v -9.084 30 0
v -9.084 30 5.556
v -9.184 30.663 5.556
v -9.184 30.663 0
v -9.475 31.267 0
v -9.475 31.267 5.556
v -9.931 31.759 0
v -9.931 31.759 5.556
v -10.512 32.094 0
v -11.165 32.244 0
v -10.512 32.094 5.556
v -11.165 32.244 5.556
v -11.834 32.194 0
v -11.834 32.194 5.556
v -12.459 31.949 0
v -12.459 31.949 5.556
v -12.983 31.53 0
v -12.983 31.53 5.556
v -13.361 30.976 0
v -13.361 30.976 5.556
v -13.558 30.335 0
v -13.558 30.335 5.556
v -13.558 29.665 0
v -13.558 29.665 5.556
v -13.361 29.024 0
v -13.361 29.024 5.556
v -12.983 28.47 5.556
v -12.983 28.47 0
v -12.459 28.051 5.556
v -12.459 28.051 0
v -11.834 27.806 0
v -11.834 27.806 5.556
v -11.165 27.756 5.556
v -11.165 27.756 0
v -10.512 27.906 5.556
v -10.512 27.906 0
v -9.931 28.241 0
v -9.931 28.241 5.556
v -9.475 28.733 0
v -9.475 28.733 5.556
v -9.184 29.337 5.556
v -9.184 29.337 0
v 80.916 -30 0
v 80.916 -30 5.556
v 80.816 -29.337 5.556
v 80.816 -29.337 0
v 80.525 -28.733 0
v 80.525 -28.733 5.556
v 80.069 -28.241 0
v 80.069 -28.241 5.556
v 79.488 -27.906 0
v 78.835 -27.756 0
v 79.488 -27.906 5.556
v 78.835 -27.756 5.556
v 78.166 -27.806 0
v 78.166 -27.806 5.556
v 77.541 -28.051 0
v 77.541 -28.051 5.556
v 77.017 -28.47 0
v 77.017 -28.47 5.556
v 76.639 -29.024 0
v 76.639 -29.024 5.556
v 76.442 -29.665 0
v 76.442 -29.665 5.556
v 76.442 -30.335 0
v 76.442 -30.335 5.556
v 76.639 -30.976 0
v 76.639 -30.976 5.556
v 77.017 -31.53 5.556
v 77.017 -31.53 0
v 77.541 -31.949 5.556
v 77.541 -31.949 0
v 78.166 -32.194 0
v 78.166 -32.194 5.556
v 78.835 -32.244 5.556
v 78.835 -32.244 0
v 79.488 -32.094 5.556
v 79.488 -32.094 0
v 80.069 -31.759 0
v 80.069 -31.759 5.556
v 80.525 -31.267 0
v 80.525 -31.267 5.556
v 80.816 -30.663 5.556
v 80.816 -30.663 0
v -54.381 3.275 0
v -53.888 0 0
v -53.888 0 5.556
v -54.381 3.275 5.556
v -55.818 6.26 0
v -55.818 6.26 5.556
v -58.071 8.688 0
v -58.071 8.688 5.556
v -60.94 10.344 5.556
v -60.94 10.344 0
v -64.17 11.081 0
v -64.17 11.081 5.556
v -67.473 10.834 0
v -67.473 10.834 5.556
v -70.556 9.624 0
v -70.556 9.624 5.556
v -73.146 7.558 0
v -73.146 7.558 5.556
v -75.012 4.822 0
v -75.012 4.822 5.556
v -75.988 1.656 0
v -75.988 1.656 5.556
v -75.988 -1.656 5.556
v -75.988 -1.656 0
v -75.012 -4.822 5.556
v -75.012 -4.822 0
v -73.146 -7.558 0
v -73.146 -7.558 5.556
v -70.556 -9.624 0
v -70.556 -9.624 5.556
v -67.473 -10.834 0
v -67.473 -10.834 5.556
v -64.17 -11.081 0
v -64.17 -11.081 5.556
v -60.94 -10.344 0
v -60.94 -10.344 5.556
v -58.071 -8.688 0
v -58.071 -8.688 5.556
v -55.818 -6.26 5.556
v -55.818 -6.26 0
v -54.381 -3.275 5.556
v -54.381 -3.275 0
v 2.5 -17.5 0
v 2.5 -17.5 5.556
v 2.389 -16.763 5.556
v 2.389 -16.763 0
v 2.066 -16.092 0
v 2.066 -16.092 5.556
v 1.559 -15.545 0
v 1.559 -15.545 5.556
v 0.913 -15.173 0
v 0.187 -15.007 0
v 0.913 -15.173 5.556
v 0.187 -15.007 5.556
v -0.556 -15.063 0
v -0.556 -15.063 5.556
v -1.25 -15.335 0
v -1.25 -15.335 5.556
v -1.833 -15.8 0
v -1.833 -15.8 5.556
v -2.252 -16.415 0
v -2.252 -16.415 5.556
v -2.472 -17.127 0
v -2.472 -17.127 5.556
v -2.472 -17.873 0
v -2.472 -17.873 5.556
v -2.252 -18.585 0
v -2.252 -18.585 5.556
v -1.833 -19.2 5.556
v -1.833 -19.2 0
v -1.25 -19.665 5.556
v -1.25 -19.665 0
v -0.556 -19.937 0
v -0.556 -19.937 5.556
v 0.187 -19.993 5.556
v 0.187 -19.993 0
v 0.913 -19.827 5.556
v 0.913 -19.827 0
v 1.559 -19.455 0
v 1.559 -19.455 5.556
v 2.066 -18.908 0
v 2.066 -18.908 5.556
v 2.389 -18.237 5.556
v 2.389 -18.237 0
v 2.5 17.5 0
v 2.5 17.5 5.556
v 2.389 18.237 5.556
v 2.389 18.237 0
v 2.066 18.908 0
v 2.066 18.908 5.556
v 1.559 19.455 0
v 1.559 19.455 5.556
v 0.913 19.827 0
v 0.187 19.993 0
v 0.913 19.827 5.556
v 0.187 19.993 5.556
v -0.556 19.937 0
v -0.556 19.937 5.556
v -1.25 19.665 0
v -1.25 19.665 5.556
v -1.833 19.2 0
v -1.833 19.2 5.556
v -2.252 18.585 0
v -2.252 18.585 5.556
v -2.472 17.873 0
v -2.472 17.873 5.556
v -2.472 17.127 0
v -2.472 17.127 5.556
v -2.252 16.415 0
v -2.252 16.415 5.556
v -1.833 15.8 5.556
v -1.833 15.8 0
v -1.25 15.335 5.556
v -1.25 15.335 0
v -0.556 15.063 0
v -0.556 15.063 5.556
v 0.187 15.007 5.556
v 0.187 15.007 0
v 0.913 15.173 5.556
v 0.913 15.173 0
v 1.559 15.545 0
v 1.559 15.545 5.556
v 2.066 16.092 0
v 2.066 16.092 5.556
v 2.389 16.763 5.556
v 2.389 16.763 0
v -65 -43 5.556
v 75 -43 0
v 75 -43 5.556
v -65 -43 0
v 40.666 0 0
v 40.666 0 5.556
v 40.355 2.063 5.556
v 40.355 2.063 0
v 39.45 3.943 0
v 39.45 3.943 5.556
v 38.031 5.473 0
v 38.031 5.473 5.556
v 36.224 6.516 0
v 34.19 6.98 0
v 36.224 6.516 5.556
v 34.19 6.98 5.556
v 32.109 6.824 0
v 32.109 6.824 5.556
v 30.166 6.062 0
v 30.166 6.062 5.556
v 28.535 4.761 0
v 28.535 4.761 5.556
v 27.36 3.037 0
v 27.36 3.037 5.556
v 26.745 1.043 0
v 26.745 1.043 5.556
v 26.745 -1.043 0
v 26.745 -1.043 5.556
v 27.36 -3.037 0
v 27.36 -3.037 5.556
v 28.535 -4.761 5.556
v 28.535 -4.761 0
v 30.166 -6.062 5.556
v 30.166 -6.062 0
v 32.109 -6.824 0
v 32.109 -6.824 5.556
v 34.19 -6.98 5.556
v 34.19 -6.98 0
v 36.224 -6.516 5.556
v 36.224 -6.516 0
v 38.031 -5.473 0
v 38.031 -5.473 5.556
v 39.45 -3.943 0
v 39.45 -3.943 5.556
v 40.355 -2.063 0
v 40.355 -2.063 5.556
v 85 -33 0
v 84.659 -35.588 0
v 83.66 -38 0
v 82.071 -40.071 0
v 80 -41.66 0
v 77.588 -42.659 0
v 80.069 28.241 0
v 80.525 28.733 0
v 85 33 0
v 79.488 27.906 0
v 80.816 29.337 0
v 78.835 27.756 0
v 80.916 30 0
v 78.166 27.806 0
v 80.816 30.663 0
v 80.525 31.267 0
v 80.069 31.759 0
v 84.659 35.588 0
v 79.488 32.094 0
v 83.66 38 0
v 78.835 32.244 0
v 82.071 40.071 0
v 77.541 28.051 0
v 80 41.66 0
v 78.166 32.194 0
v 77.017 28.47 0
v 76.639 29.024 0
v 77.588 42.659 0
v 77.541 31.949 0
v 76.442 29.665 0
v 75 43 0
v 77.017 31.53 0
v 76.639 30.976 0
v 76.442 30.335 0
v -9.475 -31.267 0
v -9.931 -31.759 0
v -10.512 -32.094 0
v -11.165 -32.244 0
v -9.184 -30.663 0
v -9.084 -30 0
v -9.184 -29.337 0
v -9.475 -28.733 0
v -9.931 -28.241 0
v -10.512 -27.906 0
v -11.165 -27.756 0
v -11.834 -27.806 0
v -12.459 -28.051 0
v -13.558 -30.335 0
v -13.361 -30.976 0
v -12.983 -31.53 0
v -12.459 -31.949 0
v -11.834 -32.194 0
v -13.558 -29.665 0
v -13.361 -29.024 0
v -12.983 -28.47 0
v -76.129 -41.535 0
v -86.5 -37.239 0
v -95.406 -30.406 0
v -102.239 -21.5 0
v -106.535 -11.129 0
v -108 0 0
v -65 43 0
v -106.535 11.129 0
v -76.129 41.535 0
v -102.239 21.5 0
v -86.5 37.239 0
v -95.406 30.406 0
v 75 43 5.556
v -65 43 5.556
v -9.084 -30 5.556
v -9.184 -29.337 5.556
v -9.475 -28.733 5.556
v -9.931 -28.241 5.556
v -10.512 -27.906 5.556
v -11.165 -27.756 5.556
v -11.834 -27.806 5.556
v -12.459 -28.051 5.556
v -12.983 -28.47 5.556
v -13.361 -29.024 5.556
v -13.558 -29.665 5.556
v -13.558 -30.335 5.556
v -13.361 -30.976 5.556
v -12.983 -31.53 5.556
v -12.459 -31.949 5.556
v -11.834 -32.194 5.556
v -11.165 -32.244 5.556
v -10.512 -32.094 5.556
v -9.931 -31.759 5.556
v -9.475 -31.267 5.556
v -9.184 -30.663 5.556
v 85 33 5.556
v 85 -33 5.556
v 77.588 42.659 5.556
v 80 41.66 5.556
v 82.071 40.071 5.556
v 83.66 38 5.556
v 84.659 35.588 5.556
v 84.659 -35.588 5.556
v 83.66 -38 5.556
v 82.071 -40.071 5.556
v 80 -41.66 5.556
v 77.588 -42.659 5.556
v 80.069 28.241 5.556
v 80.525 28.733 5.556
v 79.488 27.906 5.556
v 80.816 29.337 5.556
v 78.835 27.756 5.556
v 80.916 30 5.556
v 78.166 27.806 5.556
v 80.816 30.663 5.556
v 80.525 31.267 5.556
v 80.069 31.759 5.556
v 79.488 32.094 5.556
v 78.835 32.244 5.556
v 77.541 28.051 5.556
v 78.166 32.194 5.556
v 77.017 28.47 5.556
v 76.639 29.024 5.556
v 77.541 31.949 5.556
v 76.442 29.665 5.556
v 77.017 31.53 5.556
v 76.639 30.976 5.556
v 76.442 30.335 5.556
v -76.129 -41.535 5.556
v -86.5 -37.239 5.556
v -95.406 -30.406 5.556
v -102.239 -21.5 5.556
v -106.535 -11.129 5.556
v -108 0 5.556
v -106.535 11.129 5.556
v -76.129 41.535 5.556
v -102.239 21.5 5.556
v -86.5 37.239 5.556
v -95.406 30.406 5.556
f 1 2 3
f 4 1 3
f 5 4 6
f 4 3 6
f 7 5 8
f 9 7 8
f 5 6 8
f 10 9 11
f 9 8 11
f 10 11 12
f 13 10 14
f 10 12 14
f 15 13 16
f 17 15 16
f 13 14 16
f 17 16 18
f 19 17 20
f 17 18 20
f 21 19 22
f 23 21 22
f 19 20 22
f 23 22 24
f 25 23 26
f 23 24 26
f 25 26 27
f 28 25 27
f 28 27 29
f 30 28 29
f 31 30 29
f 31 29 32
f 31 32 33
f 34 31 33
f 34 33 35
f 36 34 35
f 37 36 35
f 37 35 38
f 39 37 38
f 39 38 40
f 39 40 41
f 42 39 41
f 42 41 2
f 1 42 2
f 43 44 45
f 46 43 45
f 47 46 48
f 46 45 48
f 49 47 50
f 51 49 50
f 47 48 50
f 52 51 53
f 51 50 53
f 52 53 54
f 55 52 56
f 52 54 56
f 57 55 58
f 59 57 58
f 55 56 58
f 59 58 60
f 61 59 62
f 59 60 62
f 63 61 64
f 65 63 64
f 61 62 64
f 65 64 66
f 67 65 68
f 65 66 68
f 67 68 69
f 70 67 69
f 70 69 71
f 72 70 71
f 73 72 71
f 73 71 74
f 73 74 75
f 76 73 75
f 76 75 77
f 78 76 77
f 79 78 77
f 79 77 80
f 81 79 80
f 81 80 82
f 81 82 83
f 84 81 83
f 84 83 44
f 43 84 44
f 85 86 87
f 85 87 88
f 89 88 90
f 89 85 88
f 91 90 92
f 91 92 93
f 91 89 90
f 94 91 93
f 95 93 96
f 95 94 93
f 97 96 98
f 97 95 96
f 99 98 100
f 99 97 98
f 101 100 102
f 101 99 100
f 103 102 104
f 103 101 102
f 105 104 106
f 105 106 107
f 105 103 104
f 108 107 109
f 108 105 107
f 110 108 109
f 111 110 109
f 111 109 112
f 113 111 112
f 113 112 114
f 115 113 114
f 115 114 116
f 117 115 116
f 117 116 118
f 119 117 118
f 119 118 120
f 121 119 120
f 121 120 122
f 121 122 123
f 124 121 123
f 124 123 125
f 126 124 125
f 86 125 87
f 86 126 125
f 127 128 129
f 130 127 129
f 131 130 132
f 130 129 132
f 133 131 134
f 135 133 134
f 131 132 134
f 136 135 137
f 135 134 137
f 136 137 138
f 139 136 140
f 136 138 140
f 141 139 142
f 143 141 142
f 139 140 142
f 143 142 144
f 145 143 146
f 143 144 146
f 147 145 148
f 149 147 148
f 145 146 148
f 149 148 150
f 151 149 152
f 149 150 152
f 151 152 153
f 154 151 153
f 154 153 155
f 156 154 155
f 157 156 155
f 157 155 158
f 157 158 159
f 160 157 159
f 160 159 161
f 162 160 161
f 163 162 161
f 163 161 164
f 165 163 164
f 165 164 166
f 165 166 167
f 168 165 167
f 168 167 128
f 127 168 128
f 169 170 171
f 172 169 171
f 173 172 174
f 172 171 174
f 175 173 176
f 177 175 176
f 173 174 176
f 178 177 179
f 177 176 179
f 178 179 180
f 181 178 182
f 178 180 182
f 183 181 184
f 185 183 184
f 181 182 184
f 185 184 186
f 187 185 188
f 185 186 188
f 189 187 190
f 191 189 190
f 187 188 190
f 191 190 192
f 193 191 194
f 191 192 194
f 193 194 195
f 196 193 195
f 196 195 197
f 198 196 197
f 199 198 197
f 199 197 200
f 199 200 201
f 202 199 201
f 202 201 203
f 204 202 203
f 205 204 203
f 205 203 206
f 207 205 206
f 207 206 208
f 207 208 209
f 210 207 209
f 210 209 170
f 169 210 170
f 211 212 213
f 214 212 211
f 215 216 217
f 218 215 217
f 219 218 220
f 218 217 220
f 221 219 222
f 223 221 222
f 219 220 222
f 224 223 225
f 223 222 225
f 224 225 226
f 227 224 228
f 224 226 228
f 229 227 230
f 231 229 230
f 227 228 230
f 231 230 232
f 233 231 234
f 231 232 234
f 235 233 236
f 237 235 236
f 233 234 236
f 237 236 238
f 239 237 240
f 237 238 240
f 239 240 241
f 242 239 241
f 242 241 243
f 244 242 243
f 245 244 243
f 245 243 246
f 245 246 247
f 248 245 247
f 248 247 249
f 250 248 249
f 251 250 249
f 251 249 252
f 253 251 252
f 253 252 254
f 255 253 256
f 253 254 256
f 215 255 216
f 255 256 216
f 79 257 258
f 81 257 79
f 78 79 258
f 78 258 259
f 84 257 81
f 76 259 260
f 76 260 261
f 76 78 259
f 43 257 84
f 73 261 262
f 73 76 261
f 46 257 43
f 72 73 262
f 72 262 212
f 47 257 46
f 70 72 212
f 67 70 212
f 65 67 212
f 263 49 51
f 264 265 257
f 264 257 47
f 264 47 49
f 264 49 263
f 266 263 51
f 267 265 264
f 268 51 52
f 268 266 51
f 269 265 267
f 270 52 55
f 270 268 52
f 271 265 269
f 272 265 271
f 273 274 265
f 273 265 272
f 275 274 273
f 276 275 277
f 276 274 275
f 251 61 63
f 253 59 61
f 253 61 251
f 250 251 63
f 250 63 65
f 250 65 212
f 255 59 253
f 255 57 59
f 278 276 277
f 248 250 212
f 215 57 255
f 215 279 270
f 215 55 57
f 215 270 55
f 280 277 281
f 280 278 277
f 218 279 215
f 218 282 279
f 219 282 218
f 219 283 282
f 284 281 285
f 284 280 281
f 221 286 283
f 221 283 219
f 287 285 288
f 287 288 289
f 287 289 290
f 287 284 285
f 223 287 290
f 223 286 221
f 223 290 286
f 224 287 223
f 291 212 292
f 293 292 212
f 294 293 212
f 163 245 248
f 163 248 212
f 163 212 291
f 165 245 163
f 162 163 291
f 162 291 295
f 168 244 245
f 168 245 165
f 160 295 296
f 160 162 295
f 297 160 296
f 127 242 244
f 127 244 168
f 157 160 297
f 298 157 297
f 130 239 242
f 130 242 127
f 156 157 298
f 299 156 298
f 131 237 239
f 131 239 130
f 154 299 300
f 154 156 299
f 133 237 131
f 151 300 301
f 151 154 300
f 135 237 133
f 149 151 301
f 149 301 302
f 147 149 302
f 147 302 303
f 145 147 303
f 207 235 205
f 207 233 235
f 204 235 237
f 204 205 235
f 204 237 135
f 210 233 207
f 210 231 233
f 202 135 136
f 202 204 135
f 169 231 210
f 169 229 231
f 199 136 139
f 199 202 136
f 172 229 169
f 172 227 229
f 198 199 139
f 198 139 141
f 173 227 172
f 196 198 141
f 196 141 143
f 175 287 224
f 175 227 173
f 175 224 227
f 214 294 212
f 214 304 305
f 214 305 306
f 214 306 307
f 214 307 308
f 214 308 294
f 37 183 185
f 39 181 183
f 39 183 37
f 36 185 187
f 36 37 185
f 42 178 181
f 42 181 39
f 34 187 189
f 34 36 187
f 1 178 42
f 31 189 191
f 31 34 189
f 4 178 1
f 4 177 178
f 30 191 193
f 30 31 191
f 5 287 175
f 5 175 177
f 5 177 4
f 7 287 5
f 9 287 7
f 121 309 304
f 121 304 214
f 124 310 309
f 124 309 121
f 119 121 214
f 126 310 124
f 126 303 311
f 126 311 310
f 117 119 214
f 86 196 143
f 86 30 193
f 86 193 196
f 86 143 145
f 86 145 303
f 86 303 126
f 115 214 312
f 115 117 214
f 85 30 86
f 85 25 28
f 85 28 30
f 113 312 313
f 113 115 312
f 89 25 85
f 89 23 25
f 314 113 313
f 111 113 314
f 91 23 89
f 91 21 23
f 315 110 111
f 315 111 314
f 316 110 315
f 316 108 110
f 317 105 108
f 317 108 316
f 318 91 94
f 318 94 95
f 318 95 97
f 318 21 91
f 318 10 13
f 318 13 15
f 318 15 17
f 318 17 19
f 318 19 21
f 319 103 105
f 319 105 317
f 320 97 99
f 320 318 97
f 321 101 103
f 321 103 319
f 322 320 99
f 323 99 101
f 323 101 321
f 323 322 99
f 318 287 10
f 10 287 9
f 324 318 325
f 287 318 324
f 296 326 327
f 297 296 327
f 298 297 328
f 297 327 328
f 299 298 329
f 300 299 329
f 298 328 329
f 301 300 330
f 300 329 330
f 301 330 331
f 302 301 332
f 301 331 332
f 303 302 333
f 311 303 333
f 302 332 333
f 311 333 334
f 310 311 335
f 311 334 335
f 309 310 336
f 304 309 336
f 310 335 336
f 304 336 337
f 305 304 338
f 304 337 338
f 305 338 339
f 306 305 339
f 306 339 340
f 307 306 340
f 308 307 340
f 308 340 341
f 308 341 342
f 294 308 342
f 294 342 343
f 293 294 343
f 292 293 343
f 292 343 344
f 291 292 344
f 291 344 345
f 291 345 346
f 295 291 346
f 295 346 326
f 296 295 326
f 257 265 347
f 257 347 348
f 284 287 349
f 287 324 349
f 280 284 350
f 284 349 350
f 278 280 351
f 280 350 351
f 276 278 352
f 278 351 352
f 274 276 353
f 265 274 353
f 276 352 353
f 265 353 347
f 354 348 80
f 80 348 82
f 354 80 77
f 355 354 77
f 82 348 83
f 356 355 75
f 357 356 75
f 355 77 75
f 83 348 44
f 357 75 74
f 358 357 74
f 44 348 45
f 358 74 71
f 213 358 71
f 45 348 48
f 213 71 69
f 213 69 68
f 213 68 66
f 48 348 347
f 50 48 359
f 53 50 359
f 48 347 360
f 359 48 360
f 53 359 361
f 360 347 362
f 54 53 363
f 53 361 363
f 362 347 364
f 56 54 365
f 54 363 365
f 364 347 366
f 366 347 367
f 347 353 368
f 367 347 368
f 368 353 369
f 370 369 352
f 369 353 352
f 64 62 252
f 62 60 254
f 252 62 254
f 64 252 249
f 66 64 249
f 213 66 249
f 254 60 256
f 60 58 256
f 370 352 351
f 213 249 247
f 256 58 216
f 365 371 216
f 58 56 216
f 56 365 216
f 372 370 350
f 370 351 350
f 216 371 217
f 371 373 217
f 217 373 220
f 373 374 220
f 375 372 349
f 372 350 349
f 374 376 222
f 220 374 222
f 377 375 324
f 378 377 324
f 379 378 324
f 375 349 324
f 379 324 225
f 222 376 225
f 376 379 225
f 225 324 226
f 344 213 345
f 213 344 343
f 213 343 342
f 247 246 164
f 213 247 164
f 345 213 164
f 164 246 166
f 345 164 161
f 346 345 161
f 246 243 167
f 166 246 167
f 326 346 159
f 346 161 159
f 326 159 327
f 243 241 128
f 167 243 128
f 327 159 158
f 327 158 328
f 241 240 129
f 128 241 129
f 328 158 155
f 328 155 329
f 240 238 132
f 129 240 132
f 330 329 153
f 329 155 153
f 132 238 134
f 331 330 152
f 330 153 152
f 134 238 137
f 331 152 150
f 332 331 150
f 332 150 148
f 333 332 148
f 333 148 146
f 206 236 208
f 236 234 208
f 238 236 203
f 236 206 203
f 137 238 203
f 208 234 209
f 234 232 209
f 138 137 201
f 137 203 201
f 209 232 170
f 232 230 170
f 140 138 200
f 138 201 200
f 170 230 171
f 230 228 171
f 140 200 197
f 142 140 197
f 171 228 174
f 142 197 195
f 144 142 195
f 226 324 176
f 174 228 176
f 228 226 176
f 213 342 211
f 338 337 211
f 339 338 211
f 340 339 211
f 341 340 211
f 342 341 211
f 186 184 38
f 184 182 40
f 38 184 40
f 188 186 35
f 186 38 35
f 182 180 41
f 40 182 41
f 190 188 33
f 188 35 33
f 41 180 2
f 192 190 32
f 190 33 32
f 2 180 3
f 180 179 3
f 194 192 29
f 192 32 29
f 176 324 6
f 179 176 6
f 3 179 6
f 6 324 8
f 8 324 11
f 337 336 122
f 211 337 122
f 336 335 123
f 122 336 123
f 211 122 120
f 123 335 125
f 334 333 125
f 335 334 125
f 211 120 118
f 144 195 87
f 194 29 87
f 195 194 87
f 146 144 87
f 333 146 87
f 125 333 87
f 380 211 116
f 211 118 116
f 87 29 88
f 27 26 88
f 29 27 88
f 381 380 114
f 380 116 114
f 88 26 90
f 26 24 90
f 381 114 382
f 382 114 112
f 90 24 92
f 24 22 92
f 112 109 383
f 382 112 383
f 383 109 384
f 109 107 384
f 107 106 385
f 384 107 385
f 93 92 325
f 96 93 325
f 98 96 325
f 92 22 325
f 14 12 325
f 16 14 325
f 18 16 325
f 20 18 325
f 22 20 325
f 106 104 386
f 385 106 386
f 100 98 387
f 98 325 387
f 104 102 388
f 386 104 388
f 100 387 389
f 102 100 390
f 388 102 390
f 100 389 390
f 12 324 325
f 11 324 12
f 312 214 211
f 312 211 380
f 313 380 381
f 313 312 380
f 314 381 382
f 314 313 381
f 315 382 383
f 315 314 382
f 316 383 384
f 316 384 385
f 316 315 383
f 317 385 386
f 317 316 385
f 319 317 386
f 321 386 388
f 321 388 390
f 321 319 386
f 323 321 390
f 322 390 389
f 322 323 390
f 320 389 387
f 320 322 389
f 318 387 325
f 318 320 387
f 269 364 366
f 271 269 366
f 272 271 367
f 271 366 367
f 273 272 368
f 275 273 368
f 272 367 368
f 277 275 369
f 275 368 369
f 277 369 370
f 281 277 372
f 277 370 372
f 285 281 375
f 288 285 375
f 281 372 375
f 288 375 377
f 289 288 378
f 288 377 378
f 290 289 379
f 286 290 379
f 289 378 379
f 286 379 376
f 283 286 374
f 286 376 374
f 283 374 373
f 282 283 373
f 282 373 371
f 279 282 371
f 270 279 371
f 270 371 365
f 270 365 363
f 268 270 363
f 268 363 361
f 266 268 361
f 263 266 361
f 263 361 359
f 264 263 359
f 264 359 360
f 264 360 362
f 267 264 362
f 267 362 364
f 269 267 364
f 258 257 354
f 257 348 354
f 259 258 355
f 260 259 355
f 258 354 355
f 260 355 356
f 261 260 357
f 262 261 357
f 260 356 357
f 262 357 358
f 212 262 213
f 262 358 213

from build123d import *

# Parameters (mm, degrees)
SKETCH1_R           = 11.1125
BOSS_EXTRUDE1_DEPTH = 5.55625
SKETCH2_R           = 7.000000001
CUT_EXTRUDE1_DEPTH  = 5.55625
FILLET1_R           = 10
SKETCH3_R           = 2.250000001
CUT_EXTRUDE2_DEPTH  = 6.35
SKETCH4_R           = 2.5
CUT_EXTRUDE3_DEPTH  = 40


with BuildPart() as part:
    # Sketch1 → Boss-Extrude1 (new body)
    with BuildSketch(Plane.XY):
        with BuildLine():
            Line((-65, 43), (85, 43))
            Line((85, 43), (85, -43))
            Line((85, -43), (-65, -43))
            ThreePointArc((-65, -43), (-108, 0), (-65, 43))
        make_face()
        with Locations((-65, 0)):
            Circle(SKETCH1_R, mode=Mode.SUBTRACT)
    extrude(amount=BOSS_EXTRUDE1_DEPTH)

    # Sketch2 → Cut-Extrude1 (cut)
    with BuildSketch(Plane.XY.offset(5.55625)):
        with Locations((33.66639768, 0)):
            Circle(SKETCH2_R)
    extrude(amount=-CUT_EXTRUDE1_DEPTH, mode=Mode.SUBTRACT)

    # Fillet1
    fillet1_edges = [part.edges().sort_by_distance(p)[0] for p in [
        (85, 43, 2.778125),
        (85, -43, 2.778125),
    ]]
    fillet(fillet1_edges, radius=FILLET1_R)

    # Sketch3 → Cut-Extrude2 (cut)
    with BuildSketch(Plane.XY.offset(5.55625)):
        with Locations((78.66639768, 30)):
            Circle(SKETCH3_R)
        with Locations((78.66639768, -30)):
            Circle(SKETCH3_R)
        with Locations((-11.33360232, 30)):
            Circle(SKETCH3_R)
        with Locations((-11.33360232, -30)):
            Circle(SKETCH3_R)
    extrude(amount=-CUT_EXTRUDE2_DEPTH, mode=Mode.SUBTRACT)

    # Sketch4 → Cut-Extrude3 (cut)
    with BuildSketch(Plane.XY.offset(5.55625)):
        with Locations((0, 17.5)):
            Circle(SKETCH4_R)
        with Locations((0, -17.5)):
            Circle(SKETCH4_R)
    extrude(amount=-CUT_EXTRUDE3_DEPTH, mode=Mode.SUBTRACT)


solid = part.part
